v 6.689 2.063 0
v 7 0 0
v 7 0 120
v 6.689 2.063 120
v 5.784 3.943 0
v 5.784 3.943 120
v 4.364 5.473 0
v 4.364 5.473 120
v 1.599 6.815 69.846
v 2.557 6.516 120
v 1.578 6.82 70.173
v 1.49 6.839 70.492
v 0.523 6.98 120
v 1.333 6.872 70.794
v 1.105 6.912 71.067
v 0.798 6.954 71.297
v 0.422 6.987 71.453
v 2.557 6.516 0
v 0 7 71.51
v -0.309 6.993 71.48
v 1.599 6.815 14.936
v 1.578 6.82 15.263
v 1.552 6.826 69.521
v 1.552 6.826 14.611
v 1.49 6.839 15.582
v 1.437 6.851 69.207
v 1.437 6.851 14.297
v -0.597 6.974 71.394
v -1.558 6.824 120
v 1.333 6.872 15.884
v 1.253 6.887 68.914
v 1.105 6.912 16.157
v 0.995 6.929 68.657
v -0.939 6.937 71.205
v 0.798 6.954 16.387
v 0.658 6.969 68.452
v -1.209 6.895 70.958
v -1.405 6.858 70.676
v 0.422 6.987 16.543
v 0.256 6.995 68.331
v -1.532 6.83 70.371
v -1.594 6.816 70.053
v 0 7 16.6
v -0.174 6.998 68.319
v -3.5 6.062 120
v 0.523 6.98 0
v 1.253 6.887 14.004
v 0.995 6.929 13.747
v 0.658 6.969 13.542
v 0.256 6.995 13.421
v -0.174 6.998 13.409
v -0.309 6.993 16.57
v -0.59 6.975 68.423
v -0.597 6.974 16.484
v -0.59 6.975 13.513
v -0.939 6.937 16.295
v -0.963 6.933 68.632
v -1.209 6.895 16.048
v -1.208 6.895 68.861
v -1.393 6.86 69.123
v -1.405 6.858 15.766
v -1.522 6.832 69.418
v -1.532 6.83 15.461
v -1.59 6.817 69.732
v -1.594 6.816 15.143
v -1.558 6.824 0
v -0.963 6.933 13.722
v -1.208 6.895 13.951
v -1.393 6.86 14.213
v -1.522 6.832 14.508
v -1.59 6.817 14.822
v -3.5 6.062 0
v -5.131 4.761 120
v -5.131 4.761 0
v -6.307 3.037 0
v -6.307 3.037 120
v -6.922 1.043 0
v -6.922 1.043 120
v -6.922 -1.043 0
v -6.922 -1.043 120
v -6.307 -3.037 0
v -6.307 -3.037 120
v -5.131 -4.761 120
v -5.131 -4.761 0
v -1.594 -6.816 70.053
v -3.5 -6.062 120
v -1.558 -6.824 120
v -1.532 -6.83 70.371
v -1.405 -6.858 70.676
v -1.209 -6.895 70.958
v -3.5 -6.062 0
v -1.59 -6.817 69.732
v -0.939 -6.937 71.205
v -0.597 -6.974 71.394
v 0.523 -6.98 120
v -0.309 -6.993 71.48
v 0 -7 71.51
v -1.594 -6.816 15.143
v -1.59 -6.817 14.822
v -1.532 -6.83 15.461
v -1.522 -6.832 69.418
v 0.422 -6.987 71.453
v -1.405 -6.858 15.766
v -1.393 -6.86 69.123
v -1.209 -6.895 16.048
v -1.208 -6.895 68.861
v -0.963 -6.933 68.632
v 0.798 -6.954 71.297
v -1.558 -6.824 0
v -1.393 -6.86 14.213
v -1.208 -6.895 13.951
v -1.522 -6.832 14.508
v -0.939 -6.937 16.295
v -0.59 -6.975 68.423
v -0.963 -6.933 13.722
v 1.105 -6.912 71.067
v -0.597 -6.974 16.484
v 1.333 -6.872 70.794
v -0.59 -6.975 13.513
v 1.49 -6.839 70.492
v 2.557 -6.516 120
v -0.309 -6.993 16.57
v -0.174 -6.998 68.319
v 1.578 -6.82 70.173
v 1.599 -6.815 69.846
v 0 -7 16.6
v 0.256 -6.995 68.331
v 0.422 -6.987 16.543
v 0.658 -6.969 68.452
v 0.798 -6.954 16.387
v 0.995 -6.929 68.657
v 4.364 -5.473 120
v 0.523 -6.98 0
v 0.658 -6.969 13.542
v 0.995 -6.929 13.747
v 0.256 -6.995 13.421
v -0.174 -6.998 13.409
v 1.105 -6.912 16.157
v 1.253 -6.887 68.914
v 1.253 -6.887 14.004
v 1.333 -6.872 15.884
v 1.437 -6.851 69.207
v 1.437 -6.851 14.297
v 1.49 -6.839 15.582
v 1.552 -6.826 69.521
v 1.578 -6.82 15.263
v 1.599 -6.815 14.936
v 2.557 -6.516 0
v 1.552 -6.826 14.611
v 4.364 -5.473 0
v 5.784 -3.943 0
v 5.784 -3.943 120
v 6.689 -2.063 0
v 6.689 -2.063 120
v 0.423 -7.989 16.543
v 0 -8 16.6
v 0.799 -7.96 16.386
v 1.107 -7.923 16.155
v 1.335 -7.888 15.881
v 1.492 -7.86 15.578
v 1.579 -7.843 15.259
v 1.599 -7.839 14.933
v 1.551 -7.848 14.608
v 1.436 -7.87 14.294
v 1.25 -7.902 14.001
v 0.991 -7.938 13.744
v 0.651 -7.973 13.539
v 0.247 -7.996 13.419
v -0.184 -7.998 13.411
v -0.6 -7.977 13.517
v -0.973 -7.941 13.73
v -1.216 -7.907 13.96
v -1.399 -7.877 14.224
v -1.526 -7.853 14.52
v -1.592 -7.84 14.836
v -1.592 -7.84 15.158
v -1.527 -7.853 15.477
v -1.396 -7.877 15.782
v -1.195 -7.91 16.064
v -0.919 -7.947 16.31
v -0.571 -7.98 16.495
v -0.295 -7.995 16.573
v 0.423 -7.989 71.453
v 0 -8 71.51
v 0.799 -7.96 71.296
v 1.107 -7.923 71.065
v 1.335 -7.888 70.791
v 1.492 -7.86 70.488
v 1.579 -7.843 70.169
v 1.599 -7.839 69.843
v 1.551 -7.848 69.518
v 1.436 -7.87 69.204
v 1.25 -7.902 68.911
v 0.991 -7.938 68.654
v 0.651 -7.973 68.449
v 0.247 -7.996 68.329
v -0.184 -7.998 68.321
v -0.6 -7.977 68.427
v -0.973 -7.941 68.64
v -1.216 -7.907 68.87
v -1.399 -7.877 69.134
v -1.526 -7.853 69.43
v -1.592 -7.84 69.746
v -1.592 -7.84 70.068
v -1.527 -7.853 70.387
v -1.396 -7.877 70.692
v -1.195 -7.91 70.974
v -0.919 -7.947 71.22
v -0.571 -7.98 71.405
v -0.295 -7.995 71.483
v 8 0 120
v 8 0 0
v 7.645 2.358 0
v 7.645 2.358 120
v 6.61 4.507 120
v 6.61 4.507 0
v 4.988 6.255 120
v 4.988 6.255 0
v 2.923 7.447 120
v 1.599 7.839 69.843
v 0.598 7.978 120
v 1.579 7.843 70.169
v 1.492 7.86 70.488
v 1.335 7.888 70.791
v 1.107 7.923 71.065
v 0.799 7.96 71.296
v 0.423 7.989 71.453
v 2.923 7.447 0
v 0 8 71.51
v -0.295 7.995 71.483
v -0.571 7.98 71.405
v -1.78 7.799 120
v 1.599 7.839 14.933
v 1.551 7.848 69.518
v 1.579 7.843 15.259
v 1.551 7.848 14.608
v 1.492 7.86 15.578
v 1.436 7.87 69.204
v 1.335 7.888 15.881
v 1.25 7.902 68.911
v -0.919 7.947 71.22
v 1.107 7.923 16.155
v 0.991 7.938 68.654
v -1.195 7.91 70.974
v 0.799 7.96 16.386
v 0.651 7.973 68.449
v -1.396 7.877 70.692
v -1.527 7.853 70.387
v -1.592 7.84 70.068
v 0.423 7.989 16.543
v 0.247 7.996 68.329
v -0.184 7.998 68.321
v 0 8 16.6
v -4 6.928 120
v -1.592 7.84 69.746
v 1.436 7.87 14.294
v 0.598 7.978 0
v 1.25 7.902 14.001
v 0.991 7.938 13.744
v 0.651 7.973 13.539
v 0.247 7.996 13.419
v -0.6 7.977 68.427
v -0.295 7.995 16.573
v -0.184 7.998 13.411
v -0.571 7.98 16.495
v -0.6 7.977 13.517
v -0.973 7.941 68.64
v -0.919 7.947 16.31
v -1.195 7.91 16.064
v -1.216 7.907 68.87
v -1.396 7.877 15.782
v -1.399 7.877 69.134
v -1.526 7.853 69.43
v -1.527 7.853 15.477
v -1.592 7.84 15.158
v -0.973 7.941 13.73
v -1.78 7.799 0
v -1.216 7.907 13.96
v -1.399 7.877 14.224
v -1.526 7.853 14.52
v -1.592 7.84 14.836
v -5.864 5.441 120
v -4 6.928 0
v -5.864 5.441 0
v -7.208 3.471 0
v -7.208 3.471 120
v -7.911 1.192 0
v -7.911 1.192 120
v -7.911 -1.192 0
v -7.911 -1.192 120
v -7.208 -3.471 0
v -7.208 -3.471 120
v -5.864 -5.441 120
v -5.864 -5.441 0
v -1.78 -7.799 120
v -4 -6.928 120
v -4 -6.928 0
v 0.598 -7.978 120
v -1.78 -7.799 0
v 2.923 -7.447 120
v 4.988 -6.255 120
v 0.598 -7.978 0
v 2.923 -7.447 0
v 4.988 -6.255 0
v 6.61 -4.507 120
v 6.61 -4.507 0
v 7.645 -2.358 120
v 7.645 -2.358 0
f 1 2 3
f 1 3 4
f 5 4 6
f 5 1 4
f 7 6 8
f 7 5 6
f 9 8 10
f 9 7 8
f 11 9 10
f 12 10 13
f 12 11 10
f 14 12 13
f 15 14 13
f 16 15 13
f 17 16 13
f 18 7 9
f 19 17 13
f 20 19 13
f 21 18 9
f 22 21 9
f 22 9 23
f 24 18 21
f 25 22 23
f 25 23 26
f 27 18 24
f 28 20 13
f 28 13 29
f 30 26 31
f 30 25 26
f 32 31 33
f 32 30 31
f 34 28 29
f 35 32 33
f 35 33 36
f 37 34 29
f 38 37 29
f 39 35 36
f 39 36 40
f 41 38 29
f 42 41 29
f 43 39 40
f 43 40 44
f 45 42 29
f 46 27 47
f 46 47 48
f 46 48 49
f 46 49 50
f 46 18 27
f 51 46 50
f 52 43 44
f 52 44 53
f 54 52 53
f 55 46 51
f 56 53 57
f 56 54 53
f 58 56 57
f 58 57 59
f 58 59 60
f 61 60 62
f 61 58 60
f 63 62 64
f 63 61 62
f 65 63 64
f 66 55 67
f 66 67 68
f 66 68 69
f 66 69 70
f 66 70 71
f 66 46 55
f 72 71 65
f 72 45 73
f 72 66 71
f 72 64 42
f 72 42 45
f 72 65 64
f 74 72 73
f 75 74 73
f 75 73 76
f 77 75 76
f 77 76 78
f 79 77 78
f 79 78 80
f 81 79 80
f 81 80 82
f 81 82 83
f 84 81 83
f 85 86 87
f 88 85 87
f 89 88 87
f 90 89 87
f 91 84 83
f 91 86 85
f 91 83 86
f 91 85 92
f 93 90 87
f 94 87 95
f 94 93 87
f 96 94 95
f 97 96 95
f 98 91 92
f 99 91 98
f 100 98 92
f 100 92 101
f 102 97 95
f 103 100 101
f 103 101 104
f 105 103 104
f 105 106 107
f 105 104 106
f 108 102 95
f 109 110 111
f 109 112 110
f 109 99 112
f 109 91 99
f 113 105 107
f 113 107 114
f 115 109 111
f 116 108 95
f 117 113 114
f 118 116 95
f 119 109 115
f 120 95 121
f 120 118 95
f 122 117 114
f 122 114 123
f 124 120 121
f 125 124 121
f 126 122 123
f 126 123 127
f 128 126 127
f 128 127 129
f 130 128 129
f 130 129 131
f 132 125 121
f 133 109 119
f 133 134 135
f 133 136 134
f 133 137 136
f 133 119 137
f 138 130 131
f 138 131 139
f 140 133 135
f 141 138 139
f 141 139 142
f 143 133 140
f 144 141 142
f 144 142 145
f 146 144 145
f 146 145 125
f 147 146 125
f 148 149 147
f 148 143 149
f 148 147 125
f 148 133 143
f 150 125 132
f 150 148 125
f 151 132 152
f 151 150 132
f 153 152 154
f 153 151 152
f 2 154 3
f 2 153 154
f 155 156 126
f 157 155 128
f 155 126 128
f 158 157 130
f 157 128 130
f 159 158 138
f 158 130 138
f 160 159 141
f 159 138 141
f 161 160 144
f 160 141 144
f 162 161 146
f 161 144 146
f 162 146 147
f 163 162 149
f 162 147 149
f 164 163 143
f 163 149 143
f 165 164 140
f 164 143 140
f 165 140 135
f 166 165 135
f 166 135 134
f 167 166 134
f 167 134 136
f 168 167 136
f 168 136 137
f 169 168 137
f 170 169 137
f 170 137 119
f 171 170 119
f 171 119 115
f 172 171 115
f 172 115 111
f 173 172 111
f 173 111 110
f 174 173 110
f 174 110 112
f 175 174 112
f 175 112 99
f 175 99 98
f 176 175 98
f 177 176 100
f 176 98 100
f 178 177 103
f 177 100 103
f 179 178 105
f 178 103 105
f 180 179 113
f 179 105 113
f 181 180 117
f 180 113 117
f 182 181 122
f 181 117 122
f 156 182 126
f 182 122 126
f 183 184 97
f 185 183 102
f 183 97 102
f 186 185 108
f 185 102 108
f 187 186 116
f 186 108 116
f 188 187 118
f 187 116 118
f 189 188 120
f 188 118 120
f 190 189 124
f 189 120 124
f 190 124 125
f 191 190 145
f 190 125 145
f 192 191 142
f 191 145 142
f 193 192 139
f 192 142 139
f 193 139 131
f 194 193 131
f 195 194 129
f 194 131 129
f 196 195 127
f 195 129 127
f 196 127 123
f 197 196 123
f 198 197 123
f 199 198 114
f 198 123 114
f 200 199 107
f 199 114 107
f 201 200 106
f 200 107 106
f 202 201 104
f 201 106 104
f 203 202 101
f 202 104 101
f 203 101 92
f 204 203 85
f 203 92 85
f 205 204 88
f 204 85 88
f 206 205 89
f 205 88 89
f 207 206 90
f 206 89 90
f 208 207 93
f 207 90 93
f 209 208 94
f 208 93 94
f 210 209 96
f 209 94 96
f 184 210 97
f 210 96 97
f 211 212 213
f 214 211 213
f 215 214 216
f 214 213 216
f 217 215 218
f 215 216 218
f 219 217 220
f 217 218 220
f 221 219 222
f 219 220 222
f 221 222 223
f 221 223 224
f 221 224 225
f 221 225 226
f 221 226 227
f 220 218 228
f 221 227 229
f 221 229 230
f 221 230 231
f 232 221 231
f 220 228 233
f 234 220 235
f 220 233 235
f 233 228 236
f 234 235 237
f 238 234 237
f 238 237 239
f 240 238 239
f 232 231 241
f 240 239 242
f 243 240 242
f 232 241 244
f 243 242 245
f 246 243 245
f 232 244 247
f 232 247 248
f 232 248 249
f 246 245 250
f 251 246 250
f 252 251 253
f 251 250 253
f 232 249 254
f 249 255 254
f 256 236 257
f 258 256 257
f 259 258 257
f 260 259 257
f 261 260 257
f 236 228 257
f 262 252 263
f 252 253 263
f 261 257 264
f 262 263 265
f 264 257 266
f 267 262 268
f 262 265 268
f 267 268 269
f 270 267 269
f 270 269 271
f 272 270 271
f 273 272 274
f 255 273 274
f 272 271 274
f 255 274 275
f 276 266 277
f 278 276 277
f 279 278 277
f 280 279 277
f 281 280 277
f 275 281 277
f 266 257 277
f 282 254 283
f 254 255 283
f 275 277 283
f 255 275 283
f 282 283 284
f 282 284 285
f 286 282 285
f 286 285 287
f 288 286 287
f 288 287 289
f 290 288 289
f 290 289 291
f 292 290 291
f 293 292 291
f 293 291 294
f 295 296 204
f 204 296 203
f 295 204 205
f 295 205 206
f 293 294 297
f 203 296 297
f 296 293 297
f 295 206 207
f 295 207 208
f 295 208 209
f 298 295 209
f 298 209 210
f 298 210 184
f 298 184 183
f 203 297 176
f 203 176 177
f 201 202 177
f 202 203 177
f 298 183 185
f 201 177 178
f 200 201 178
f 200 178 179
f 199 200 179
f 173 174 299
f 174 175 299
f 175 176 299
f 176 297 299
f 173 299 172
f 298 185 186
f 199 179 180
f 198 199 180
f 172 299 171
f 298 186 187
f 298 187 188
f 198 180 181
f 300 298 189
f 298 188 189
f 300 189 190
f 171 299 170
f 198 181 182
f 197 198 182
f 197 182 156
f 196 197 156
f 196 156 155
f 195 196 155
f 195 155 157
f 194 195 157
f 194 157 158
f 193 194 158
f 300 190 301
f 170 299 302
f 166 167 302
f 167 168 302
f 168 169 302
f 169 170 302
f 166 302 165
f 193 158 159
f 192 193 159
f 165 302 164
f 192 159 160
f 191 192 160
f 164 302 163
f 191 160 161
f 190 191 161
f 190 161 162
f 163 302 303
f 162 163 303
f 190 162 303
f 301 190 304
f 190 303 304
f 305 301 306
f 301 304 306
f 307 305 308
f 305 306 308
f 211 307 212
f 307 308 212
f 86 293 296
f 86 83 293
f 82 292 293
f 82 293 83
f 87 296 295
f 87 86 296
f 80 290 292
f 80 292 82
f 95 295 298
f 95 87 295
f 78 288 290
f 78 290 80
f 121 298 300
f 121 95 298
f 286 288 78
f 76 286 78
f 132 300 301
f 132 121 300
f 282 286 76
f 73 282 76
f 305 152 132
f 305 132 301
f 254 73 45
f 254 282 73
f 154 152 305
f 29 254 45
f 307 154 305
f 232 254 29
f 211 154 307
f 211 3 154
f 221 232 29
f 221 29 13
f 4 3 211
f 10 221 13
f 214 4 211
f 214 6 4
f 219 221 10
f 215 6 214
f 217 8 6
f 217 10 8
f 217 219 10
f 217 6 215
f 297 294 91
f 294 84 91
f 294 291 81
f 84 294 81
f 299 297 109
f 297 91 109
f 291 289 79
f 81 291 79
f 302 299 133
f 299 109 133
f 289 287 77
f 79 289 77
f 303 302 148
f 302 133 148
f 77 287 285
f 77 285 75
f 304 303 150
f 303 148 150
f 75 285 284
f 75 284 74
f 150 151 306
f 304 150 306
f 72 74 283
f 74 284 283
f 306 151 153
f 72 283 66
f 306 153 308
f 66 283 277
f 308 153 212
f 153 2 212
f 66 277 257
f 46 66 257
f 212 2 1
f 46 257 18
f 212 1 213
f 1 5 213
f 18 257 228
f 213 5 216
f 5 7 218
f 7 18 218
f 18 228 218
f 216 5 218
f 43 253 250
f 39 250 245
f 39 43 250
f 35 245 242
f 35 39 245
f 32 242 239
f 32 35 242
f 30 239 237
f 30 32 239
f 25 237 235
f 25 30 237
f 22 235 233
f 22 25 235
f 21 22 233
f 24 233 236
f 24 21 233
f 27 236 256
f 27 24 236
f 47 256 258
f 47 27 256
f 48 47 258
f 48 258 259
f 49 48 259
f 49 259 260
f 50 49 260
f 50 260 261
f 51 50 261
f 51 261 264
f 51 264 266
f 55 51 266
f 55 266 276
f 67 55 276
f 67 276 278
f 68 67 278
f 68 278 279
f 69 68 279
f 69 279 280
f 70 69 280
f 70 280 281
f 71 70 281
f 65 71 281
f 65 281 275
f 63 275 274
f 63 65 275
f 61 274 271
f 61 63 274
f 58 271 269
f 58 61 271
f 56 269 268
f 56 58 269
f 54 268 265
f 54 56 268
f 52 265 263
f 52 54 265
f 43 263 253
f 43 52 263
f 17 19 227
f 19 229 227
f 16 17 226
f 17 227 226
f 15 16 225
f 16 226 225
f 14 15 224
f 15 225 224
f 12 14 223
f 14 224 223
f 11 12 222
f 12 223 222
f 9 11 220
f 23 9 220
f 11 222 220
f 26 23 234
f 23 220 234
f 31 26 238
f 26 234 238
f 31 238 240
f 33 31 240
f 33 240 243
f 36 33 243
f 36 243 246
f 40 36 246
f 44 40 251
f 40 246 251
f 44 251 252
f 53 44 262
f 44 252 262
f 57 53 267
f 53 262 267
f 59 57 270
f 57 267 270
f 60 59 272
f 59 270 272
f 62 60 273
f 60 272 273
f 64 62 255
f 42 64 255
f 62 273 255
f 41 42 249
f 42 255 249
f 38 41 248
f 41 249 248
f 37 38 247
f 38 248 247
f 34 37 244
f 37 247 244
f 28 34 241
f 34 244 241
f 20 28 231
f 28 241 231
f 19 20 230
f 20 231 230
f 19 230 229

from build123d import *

# Parameters (mm, degrees)
SKETCH_1_R          = 8
SKETCH_1_R_2        = 7
EXTRUDE_1_DEPTH     = 120
SKETCH_2_R          = 1.6
CUT_EXTRUDE_1_DEPTH = 300


with BuildPart() as part:
    # 草图1 → 凸台-拉伸1 (new body)
    with BuildSketch(Plane.XY):
        Circle(SKETCH_1_R)
        Circle(SKETCH_1_R_2, mode=Mode.SUBTRACT)
    extrude(amount=EXTRUDE_1_DEPTH)

    # 草图2 → 切除-拉伸1 (cut, symmetric)
    with BuildSketch(Plane(origin=(0, 0, 0), x_dir=(1, 0, 0), z_dir=(0, 1, 0))):
        with Locations(Location((0, -15, 0), (0, 0, 270))):
            Circle(SKETCH_2_R)
        with Locations(Location((0, -69.91, 0), (0, 0, 270))):
            Circle(SKETCH_2_R)
    extrude(amount=CUT_EXTRUDE_1_DEPTH, both=True, mode=Mode.SUBTRACT)


solid = part.part
